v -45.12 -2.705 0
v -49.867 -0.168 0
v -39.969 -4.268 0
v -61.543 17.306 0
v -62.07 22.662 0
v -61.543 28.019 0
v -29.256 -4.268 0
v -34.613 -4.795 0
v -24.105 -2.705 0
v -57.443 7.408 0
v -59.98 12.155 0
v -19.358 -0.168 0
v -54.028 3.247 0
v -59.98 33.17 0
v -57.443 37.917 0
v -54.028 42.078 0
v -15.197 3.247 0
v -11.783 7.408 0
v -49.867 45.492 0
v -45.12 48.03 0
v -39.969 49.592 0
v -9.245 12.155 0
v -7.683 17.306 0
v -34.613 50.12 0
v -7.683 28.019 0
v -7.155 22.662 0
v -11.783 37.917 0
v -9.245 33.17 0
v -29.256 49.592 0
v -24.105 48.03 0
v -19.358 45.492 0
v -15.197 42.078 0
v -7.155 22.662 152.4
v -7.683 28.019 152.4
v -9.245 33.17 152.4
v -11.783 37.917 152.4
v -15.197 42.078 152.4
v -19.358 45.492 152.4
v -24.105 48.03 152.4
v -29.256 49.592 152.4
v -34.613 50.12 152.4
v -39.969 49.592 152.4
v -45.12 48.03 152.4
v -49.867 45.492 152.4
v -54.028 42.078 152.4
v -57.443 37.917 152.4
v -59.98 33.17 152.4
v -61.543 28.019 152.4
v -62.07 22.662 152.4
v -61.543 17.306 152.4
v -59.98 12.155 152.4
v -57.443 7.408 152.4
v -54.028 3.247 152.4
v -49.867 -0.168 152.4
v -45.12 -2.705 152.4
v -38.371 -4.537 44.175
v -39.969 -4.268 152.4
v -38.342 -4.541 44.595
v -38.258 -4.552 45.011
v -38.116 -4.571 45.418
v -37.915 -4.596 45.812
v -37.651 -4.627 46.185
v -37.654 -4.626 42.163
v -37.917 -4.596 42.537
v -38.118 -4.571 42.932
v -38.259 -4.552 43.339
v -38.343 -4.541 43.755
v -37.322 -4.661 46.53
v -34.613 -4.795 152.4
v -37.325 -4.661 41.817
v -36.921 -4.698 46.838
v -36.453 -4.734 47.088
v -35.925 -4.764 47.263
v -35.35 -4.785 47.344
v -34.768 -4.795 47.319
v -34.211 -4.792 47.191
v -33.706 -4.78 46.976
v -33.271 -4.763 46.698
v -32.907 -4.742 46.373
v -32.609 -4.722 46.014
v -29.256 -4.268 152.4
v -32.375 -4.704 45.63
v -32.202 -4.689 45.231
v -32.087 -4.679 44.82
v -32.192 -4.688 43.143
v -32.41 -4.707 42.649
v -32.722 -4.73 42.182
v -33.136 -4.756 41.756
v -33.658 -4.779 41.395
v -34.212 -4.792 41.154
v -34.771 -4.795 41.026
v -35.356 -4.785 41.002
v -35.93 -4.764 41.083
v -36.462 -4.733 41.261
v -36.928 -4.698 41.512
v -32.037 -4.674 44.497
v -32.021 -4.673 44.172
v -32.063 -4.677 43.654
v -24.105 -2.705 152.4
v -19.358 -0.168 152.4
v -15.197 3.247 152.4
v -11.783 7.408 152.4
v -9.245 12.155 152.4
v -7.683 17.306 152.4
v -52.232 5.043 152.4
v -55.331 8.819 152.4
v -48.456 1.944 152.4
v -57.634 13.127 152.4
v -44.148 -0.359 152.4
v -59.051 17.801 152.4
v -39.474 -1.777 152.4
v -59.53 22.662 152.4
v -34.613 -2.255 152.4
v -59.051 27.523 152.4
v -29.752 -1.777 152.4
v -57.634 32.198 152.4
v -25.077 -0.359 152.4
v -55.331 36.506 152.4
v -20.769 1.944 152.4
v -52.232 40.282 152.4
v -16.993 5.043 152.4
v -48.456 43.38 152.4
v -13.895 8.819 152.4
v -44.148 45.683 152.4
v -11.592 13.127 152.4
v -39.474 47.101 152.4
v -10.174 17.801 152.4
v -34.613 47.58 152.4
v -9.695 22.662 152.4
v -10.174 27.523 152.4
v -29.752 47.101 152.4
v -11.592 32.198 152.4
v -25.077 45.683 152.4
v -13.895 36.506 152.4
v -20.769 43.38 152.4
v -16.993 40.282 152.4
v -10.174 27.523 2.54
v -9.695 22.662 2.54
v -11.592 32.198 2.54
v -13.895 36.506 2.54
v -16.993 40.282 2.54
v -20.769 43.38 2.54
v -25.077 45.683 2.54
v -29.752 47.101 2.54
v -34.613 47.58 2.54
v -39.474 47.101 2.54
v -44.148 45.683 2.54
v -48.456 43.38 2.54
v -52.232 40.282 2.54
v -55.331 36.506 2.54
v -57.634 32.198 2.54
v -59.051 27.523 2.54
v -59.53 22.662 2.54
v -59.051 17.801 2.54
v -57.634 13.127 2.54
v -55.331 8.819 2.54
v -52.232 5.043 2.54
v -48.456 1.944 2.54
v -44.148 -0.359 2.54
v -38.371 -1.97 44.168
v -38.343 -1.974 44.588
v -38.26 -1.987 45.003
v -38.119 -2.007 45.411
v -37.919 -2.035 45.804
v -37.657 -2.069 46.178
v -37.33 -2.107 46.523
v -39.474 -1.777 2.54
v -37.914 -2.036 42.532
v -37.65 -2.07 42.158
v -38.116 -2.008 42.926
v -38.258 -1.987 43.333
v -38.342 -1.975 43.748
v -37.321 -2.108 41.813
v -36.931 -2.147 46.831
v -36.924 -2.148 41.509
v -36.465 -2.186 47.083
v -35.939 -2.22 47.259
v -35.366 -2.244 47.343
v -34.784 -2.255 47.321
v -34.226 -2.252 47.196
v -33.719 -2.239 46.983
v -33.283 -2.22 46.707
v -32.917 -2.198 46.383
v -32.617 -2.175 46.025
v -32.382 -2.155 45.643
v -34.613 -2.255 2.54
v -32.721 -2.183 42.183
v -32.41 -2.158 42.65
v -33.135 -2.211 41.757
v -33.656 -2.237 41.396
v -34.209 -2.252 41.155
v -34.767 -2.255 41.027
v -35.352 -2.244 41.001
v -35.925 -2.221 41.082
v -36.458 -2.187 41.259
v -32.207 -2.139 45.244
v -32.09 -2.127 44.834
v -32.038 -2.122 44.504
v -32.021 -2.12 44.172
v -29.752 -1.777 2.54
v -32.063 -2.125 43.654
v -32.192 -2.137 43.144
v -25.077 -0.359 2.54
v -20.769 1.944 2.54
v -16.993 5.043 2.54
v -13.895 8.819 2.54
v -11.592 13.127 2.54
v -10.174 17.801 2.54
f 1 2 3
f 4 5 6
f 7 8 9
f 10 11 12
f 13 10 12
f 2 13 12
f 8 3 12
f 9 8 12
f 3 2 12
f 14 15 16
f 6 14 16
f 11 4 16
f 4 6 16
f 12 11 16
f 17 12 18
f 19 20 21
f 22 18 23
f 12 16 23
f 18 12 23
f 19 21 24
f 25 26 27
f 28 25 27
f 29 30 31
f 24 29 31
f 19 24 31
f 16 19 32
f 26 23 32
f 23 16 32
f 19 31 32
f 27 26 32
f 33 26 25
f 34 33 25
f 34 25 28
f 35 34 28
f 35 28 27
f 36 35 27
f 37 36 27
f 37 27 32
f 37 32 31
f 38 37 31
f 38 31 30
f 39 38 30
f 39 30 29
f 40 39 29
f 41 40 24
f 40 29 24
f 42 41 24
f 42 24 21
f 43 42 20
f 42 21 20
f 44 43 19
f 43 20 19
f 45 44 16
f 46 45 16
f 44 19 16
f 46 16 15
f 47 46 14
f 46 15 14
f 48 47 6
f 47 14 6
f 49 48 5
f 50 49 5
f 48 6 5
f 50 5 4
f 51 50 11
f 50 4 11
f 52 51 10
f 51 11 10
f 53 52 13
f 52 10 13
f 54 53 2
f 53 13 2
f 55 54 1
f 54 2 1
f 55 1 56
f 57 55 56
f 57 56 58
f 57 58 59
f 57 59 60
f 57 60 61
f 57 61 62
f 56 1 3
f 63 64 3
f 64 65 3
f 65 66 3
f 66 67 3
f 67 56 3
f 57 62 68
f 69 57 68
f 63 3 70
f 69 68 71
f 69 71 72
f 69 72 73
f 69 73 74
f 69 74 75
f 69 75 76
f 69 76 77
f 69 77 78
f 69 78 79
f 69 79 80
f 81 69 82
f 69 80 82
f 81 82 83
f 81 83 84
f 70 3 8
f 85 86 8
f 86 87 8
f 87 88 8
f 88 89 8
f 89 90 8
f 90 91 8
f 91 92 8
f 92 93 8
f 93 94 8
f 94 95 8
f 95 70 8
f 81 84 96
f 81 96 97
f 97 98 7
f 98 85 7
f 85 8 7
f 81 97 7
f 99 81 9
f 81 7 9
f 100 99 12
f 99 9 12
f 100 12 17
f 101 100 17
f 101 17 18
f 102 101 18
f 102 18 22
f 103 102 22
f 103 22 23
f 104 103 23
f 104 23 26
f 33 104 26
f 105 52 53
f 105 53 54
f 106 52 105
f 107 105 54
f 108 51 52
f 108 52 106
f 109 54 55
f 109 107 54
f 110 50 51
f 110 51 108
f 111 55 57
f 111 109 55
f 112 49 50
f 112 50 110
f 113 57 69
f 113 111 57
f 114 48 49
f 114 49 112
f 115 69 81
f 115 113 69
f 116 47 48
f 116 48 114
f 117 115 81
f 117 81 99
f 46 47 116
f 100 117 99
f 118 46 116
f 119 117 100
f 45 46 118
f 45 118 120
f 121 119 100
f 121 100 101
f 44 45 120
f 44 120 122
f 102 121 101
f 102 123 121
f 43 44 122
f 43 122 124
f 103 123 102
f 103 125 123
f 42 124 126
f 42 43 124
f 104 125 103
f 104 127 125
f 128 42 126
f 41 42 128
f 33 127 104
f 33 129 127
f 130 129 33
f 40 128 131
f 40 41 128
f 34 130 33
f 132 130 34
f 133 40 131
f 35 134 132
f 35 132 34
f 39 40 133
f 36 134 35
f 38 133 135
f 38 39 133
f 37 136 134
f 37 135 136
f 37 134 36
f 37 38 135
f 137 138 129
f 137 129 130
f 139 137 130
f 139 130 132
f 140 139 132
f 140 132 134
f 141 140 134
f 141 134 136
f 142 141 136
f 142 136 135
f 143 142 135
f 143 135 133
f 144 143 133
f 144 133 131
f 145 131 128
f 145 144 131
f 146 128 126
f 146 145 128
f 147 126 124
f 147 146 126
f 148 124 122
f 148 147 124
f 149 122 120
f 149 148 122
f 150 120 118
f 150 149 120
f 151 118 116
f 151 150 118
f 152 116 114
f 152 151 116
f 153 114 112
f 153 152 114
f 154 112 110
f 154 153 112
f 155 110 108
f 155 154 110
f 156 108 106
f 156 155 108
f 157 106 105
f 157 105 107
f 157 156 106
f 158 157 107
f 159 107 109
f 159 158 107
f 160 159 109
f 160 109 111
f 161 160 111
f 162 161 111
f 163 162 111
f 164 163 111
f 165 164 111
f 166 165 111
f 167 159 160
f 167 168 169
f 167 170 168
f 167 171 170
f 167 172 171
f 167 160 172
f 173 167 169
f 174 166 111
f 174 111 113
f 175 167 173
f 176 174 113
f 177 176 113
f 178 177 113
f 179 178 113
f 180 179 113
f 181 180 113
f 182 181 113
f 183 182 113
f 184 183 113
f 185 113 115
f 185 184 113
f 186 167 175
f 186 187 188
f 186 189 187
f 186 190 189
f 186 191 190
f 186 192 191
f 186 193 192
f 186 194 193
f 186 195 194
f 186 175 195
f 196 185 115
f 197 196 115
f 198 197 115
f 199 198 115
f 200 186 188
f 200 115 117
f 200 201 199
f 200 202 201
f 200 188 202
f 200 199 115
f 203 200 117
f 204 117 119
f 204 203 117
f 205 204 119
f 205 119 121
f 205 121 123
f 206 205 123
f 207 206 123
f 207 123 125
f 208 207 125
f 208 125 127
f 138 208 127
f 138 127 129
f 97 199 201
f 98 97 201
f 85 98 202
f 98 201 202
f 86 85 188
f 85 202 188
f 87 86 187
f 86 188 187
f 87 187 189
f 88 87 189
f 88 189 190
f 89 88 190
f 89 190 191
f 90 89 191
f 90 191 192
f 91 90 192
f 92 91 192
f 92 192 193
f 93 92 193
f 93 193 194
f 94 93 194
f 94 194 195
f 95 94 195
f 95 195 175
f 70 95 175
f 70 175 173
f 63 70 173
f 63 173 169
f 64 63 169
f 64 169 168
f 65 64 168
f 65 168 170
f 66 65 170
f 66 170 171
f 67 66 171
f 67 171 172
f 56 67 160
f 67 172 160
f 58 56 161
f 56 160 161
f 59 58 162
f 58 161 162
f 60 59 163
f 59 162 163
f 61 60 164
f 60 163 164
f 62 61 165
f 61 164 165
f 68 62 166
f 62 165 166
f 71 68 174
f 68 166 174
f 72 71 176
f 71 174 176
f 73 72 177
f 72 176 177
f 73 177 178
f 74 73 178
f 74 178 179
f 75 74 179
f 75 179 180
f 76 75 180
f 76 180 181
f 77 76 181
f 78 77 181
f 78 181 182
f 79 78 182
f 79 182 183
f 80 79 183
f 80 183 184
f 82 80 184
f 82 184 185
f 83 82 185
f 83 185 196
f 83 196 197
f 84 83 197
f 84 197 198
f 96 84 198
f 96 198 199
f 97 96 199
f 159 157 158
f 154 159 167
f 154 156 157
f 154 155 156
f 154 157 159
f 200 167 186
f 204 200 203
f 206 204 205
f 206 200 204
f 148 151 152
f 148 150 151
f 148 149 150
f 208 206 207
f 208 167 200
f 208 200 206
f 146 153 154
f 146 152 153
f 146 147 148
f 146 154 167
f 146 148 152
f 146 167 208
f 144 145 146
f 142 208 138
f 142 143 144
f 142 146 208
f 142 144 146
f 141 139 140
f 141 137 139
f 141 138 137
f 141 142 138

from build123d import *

# Parameters (mm, degrees)
F0_R     = 27.4575403643
F1_DEPTH = 152.4
F2_T     = -2.54
F4_D     = 6.35
F4_DEPTH = 12.7
F4_TIP   = 1.9077324654


with BuildPart() as f1:
    # F0 (on Top) → F1 (new body)
    with BuildSketch(Plane.XY):
        with Locations((-34.6127040684, 22.6622130722)):
            Circle(F0_R)
    extrude(amount=F1_DEPTH)

    # F2
    f2_openings = [f1.faces().sort_by_distance(p)[0] for p in [
        (-34.612704, 22.662213, 152.4),
    ]]
    offset(amount=F2_T, openings=f2_openings)

    # F4 (one way)
    with BuildSketch(Plane(origin=(0, 0, 0), x_dir=(1, 0, 0), z_dir=(0, 1, 0))):
        with Locations((-35.1956561208, -44.1724844277)):
            Circle(F4_D / 2)
    extrude(amount=-F4_DEPTH, mode=Mode.SUBTRACT)
    with Locations(Plane(origin=(0, 0, 0), x_dir=(1, 0, 0), z_dir=(0, 1, 0))):
        with Locations((-35.1956561208, -44.1724844277)):
            with Locations((0, 0, -(F4_DEPTH + F4_TIP / 2))):  # 118° drill point
                Cone(0, F4_D / 2, F4_TIP, mode=Mode.SUBTRACT)


solid = f1.part
